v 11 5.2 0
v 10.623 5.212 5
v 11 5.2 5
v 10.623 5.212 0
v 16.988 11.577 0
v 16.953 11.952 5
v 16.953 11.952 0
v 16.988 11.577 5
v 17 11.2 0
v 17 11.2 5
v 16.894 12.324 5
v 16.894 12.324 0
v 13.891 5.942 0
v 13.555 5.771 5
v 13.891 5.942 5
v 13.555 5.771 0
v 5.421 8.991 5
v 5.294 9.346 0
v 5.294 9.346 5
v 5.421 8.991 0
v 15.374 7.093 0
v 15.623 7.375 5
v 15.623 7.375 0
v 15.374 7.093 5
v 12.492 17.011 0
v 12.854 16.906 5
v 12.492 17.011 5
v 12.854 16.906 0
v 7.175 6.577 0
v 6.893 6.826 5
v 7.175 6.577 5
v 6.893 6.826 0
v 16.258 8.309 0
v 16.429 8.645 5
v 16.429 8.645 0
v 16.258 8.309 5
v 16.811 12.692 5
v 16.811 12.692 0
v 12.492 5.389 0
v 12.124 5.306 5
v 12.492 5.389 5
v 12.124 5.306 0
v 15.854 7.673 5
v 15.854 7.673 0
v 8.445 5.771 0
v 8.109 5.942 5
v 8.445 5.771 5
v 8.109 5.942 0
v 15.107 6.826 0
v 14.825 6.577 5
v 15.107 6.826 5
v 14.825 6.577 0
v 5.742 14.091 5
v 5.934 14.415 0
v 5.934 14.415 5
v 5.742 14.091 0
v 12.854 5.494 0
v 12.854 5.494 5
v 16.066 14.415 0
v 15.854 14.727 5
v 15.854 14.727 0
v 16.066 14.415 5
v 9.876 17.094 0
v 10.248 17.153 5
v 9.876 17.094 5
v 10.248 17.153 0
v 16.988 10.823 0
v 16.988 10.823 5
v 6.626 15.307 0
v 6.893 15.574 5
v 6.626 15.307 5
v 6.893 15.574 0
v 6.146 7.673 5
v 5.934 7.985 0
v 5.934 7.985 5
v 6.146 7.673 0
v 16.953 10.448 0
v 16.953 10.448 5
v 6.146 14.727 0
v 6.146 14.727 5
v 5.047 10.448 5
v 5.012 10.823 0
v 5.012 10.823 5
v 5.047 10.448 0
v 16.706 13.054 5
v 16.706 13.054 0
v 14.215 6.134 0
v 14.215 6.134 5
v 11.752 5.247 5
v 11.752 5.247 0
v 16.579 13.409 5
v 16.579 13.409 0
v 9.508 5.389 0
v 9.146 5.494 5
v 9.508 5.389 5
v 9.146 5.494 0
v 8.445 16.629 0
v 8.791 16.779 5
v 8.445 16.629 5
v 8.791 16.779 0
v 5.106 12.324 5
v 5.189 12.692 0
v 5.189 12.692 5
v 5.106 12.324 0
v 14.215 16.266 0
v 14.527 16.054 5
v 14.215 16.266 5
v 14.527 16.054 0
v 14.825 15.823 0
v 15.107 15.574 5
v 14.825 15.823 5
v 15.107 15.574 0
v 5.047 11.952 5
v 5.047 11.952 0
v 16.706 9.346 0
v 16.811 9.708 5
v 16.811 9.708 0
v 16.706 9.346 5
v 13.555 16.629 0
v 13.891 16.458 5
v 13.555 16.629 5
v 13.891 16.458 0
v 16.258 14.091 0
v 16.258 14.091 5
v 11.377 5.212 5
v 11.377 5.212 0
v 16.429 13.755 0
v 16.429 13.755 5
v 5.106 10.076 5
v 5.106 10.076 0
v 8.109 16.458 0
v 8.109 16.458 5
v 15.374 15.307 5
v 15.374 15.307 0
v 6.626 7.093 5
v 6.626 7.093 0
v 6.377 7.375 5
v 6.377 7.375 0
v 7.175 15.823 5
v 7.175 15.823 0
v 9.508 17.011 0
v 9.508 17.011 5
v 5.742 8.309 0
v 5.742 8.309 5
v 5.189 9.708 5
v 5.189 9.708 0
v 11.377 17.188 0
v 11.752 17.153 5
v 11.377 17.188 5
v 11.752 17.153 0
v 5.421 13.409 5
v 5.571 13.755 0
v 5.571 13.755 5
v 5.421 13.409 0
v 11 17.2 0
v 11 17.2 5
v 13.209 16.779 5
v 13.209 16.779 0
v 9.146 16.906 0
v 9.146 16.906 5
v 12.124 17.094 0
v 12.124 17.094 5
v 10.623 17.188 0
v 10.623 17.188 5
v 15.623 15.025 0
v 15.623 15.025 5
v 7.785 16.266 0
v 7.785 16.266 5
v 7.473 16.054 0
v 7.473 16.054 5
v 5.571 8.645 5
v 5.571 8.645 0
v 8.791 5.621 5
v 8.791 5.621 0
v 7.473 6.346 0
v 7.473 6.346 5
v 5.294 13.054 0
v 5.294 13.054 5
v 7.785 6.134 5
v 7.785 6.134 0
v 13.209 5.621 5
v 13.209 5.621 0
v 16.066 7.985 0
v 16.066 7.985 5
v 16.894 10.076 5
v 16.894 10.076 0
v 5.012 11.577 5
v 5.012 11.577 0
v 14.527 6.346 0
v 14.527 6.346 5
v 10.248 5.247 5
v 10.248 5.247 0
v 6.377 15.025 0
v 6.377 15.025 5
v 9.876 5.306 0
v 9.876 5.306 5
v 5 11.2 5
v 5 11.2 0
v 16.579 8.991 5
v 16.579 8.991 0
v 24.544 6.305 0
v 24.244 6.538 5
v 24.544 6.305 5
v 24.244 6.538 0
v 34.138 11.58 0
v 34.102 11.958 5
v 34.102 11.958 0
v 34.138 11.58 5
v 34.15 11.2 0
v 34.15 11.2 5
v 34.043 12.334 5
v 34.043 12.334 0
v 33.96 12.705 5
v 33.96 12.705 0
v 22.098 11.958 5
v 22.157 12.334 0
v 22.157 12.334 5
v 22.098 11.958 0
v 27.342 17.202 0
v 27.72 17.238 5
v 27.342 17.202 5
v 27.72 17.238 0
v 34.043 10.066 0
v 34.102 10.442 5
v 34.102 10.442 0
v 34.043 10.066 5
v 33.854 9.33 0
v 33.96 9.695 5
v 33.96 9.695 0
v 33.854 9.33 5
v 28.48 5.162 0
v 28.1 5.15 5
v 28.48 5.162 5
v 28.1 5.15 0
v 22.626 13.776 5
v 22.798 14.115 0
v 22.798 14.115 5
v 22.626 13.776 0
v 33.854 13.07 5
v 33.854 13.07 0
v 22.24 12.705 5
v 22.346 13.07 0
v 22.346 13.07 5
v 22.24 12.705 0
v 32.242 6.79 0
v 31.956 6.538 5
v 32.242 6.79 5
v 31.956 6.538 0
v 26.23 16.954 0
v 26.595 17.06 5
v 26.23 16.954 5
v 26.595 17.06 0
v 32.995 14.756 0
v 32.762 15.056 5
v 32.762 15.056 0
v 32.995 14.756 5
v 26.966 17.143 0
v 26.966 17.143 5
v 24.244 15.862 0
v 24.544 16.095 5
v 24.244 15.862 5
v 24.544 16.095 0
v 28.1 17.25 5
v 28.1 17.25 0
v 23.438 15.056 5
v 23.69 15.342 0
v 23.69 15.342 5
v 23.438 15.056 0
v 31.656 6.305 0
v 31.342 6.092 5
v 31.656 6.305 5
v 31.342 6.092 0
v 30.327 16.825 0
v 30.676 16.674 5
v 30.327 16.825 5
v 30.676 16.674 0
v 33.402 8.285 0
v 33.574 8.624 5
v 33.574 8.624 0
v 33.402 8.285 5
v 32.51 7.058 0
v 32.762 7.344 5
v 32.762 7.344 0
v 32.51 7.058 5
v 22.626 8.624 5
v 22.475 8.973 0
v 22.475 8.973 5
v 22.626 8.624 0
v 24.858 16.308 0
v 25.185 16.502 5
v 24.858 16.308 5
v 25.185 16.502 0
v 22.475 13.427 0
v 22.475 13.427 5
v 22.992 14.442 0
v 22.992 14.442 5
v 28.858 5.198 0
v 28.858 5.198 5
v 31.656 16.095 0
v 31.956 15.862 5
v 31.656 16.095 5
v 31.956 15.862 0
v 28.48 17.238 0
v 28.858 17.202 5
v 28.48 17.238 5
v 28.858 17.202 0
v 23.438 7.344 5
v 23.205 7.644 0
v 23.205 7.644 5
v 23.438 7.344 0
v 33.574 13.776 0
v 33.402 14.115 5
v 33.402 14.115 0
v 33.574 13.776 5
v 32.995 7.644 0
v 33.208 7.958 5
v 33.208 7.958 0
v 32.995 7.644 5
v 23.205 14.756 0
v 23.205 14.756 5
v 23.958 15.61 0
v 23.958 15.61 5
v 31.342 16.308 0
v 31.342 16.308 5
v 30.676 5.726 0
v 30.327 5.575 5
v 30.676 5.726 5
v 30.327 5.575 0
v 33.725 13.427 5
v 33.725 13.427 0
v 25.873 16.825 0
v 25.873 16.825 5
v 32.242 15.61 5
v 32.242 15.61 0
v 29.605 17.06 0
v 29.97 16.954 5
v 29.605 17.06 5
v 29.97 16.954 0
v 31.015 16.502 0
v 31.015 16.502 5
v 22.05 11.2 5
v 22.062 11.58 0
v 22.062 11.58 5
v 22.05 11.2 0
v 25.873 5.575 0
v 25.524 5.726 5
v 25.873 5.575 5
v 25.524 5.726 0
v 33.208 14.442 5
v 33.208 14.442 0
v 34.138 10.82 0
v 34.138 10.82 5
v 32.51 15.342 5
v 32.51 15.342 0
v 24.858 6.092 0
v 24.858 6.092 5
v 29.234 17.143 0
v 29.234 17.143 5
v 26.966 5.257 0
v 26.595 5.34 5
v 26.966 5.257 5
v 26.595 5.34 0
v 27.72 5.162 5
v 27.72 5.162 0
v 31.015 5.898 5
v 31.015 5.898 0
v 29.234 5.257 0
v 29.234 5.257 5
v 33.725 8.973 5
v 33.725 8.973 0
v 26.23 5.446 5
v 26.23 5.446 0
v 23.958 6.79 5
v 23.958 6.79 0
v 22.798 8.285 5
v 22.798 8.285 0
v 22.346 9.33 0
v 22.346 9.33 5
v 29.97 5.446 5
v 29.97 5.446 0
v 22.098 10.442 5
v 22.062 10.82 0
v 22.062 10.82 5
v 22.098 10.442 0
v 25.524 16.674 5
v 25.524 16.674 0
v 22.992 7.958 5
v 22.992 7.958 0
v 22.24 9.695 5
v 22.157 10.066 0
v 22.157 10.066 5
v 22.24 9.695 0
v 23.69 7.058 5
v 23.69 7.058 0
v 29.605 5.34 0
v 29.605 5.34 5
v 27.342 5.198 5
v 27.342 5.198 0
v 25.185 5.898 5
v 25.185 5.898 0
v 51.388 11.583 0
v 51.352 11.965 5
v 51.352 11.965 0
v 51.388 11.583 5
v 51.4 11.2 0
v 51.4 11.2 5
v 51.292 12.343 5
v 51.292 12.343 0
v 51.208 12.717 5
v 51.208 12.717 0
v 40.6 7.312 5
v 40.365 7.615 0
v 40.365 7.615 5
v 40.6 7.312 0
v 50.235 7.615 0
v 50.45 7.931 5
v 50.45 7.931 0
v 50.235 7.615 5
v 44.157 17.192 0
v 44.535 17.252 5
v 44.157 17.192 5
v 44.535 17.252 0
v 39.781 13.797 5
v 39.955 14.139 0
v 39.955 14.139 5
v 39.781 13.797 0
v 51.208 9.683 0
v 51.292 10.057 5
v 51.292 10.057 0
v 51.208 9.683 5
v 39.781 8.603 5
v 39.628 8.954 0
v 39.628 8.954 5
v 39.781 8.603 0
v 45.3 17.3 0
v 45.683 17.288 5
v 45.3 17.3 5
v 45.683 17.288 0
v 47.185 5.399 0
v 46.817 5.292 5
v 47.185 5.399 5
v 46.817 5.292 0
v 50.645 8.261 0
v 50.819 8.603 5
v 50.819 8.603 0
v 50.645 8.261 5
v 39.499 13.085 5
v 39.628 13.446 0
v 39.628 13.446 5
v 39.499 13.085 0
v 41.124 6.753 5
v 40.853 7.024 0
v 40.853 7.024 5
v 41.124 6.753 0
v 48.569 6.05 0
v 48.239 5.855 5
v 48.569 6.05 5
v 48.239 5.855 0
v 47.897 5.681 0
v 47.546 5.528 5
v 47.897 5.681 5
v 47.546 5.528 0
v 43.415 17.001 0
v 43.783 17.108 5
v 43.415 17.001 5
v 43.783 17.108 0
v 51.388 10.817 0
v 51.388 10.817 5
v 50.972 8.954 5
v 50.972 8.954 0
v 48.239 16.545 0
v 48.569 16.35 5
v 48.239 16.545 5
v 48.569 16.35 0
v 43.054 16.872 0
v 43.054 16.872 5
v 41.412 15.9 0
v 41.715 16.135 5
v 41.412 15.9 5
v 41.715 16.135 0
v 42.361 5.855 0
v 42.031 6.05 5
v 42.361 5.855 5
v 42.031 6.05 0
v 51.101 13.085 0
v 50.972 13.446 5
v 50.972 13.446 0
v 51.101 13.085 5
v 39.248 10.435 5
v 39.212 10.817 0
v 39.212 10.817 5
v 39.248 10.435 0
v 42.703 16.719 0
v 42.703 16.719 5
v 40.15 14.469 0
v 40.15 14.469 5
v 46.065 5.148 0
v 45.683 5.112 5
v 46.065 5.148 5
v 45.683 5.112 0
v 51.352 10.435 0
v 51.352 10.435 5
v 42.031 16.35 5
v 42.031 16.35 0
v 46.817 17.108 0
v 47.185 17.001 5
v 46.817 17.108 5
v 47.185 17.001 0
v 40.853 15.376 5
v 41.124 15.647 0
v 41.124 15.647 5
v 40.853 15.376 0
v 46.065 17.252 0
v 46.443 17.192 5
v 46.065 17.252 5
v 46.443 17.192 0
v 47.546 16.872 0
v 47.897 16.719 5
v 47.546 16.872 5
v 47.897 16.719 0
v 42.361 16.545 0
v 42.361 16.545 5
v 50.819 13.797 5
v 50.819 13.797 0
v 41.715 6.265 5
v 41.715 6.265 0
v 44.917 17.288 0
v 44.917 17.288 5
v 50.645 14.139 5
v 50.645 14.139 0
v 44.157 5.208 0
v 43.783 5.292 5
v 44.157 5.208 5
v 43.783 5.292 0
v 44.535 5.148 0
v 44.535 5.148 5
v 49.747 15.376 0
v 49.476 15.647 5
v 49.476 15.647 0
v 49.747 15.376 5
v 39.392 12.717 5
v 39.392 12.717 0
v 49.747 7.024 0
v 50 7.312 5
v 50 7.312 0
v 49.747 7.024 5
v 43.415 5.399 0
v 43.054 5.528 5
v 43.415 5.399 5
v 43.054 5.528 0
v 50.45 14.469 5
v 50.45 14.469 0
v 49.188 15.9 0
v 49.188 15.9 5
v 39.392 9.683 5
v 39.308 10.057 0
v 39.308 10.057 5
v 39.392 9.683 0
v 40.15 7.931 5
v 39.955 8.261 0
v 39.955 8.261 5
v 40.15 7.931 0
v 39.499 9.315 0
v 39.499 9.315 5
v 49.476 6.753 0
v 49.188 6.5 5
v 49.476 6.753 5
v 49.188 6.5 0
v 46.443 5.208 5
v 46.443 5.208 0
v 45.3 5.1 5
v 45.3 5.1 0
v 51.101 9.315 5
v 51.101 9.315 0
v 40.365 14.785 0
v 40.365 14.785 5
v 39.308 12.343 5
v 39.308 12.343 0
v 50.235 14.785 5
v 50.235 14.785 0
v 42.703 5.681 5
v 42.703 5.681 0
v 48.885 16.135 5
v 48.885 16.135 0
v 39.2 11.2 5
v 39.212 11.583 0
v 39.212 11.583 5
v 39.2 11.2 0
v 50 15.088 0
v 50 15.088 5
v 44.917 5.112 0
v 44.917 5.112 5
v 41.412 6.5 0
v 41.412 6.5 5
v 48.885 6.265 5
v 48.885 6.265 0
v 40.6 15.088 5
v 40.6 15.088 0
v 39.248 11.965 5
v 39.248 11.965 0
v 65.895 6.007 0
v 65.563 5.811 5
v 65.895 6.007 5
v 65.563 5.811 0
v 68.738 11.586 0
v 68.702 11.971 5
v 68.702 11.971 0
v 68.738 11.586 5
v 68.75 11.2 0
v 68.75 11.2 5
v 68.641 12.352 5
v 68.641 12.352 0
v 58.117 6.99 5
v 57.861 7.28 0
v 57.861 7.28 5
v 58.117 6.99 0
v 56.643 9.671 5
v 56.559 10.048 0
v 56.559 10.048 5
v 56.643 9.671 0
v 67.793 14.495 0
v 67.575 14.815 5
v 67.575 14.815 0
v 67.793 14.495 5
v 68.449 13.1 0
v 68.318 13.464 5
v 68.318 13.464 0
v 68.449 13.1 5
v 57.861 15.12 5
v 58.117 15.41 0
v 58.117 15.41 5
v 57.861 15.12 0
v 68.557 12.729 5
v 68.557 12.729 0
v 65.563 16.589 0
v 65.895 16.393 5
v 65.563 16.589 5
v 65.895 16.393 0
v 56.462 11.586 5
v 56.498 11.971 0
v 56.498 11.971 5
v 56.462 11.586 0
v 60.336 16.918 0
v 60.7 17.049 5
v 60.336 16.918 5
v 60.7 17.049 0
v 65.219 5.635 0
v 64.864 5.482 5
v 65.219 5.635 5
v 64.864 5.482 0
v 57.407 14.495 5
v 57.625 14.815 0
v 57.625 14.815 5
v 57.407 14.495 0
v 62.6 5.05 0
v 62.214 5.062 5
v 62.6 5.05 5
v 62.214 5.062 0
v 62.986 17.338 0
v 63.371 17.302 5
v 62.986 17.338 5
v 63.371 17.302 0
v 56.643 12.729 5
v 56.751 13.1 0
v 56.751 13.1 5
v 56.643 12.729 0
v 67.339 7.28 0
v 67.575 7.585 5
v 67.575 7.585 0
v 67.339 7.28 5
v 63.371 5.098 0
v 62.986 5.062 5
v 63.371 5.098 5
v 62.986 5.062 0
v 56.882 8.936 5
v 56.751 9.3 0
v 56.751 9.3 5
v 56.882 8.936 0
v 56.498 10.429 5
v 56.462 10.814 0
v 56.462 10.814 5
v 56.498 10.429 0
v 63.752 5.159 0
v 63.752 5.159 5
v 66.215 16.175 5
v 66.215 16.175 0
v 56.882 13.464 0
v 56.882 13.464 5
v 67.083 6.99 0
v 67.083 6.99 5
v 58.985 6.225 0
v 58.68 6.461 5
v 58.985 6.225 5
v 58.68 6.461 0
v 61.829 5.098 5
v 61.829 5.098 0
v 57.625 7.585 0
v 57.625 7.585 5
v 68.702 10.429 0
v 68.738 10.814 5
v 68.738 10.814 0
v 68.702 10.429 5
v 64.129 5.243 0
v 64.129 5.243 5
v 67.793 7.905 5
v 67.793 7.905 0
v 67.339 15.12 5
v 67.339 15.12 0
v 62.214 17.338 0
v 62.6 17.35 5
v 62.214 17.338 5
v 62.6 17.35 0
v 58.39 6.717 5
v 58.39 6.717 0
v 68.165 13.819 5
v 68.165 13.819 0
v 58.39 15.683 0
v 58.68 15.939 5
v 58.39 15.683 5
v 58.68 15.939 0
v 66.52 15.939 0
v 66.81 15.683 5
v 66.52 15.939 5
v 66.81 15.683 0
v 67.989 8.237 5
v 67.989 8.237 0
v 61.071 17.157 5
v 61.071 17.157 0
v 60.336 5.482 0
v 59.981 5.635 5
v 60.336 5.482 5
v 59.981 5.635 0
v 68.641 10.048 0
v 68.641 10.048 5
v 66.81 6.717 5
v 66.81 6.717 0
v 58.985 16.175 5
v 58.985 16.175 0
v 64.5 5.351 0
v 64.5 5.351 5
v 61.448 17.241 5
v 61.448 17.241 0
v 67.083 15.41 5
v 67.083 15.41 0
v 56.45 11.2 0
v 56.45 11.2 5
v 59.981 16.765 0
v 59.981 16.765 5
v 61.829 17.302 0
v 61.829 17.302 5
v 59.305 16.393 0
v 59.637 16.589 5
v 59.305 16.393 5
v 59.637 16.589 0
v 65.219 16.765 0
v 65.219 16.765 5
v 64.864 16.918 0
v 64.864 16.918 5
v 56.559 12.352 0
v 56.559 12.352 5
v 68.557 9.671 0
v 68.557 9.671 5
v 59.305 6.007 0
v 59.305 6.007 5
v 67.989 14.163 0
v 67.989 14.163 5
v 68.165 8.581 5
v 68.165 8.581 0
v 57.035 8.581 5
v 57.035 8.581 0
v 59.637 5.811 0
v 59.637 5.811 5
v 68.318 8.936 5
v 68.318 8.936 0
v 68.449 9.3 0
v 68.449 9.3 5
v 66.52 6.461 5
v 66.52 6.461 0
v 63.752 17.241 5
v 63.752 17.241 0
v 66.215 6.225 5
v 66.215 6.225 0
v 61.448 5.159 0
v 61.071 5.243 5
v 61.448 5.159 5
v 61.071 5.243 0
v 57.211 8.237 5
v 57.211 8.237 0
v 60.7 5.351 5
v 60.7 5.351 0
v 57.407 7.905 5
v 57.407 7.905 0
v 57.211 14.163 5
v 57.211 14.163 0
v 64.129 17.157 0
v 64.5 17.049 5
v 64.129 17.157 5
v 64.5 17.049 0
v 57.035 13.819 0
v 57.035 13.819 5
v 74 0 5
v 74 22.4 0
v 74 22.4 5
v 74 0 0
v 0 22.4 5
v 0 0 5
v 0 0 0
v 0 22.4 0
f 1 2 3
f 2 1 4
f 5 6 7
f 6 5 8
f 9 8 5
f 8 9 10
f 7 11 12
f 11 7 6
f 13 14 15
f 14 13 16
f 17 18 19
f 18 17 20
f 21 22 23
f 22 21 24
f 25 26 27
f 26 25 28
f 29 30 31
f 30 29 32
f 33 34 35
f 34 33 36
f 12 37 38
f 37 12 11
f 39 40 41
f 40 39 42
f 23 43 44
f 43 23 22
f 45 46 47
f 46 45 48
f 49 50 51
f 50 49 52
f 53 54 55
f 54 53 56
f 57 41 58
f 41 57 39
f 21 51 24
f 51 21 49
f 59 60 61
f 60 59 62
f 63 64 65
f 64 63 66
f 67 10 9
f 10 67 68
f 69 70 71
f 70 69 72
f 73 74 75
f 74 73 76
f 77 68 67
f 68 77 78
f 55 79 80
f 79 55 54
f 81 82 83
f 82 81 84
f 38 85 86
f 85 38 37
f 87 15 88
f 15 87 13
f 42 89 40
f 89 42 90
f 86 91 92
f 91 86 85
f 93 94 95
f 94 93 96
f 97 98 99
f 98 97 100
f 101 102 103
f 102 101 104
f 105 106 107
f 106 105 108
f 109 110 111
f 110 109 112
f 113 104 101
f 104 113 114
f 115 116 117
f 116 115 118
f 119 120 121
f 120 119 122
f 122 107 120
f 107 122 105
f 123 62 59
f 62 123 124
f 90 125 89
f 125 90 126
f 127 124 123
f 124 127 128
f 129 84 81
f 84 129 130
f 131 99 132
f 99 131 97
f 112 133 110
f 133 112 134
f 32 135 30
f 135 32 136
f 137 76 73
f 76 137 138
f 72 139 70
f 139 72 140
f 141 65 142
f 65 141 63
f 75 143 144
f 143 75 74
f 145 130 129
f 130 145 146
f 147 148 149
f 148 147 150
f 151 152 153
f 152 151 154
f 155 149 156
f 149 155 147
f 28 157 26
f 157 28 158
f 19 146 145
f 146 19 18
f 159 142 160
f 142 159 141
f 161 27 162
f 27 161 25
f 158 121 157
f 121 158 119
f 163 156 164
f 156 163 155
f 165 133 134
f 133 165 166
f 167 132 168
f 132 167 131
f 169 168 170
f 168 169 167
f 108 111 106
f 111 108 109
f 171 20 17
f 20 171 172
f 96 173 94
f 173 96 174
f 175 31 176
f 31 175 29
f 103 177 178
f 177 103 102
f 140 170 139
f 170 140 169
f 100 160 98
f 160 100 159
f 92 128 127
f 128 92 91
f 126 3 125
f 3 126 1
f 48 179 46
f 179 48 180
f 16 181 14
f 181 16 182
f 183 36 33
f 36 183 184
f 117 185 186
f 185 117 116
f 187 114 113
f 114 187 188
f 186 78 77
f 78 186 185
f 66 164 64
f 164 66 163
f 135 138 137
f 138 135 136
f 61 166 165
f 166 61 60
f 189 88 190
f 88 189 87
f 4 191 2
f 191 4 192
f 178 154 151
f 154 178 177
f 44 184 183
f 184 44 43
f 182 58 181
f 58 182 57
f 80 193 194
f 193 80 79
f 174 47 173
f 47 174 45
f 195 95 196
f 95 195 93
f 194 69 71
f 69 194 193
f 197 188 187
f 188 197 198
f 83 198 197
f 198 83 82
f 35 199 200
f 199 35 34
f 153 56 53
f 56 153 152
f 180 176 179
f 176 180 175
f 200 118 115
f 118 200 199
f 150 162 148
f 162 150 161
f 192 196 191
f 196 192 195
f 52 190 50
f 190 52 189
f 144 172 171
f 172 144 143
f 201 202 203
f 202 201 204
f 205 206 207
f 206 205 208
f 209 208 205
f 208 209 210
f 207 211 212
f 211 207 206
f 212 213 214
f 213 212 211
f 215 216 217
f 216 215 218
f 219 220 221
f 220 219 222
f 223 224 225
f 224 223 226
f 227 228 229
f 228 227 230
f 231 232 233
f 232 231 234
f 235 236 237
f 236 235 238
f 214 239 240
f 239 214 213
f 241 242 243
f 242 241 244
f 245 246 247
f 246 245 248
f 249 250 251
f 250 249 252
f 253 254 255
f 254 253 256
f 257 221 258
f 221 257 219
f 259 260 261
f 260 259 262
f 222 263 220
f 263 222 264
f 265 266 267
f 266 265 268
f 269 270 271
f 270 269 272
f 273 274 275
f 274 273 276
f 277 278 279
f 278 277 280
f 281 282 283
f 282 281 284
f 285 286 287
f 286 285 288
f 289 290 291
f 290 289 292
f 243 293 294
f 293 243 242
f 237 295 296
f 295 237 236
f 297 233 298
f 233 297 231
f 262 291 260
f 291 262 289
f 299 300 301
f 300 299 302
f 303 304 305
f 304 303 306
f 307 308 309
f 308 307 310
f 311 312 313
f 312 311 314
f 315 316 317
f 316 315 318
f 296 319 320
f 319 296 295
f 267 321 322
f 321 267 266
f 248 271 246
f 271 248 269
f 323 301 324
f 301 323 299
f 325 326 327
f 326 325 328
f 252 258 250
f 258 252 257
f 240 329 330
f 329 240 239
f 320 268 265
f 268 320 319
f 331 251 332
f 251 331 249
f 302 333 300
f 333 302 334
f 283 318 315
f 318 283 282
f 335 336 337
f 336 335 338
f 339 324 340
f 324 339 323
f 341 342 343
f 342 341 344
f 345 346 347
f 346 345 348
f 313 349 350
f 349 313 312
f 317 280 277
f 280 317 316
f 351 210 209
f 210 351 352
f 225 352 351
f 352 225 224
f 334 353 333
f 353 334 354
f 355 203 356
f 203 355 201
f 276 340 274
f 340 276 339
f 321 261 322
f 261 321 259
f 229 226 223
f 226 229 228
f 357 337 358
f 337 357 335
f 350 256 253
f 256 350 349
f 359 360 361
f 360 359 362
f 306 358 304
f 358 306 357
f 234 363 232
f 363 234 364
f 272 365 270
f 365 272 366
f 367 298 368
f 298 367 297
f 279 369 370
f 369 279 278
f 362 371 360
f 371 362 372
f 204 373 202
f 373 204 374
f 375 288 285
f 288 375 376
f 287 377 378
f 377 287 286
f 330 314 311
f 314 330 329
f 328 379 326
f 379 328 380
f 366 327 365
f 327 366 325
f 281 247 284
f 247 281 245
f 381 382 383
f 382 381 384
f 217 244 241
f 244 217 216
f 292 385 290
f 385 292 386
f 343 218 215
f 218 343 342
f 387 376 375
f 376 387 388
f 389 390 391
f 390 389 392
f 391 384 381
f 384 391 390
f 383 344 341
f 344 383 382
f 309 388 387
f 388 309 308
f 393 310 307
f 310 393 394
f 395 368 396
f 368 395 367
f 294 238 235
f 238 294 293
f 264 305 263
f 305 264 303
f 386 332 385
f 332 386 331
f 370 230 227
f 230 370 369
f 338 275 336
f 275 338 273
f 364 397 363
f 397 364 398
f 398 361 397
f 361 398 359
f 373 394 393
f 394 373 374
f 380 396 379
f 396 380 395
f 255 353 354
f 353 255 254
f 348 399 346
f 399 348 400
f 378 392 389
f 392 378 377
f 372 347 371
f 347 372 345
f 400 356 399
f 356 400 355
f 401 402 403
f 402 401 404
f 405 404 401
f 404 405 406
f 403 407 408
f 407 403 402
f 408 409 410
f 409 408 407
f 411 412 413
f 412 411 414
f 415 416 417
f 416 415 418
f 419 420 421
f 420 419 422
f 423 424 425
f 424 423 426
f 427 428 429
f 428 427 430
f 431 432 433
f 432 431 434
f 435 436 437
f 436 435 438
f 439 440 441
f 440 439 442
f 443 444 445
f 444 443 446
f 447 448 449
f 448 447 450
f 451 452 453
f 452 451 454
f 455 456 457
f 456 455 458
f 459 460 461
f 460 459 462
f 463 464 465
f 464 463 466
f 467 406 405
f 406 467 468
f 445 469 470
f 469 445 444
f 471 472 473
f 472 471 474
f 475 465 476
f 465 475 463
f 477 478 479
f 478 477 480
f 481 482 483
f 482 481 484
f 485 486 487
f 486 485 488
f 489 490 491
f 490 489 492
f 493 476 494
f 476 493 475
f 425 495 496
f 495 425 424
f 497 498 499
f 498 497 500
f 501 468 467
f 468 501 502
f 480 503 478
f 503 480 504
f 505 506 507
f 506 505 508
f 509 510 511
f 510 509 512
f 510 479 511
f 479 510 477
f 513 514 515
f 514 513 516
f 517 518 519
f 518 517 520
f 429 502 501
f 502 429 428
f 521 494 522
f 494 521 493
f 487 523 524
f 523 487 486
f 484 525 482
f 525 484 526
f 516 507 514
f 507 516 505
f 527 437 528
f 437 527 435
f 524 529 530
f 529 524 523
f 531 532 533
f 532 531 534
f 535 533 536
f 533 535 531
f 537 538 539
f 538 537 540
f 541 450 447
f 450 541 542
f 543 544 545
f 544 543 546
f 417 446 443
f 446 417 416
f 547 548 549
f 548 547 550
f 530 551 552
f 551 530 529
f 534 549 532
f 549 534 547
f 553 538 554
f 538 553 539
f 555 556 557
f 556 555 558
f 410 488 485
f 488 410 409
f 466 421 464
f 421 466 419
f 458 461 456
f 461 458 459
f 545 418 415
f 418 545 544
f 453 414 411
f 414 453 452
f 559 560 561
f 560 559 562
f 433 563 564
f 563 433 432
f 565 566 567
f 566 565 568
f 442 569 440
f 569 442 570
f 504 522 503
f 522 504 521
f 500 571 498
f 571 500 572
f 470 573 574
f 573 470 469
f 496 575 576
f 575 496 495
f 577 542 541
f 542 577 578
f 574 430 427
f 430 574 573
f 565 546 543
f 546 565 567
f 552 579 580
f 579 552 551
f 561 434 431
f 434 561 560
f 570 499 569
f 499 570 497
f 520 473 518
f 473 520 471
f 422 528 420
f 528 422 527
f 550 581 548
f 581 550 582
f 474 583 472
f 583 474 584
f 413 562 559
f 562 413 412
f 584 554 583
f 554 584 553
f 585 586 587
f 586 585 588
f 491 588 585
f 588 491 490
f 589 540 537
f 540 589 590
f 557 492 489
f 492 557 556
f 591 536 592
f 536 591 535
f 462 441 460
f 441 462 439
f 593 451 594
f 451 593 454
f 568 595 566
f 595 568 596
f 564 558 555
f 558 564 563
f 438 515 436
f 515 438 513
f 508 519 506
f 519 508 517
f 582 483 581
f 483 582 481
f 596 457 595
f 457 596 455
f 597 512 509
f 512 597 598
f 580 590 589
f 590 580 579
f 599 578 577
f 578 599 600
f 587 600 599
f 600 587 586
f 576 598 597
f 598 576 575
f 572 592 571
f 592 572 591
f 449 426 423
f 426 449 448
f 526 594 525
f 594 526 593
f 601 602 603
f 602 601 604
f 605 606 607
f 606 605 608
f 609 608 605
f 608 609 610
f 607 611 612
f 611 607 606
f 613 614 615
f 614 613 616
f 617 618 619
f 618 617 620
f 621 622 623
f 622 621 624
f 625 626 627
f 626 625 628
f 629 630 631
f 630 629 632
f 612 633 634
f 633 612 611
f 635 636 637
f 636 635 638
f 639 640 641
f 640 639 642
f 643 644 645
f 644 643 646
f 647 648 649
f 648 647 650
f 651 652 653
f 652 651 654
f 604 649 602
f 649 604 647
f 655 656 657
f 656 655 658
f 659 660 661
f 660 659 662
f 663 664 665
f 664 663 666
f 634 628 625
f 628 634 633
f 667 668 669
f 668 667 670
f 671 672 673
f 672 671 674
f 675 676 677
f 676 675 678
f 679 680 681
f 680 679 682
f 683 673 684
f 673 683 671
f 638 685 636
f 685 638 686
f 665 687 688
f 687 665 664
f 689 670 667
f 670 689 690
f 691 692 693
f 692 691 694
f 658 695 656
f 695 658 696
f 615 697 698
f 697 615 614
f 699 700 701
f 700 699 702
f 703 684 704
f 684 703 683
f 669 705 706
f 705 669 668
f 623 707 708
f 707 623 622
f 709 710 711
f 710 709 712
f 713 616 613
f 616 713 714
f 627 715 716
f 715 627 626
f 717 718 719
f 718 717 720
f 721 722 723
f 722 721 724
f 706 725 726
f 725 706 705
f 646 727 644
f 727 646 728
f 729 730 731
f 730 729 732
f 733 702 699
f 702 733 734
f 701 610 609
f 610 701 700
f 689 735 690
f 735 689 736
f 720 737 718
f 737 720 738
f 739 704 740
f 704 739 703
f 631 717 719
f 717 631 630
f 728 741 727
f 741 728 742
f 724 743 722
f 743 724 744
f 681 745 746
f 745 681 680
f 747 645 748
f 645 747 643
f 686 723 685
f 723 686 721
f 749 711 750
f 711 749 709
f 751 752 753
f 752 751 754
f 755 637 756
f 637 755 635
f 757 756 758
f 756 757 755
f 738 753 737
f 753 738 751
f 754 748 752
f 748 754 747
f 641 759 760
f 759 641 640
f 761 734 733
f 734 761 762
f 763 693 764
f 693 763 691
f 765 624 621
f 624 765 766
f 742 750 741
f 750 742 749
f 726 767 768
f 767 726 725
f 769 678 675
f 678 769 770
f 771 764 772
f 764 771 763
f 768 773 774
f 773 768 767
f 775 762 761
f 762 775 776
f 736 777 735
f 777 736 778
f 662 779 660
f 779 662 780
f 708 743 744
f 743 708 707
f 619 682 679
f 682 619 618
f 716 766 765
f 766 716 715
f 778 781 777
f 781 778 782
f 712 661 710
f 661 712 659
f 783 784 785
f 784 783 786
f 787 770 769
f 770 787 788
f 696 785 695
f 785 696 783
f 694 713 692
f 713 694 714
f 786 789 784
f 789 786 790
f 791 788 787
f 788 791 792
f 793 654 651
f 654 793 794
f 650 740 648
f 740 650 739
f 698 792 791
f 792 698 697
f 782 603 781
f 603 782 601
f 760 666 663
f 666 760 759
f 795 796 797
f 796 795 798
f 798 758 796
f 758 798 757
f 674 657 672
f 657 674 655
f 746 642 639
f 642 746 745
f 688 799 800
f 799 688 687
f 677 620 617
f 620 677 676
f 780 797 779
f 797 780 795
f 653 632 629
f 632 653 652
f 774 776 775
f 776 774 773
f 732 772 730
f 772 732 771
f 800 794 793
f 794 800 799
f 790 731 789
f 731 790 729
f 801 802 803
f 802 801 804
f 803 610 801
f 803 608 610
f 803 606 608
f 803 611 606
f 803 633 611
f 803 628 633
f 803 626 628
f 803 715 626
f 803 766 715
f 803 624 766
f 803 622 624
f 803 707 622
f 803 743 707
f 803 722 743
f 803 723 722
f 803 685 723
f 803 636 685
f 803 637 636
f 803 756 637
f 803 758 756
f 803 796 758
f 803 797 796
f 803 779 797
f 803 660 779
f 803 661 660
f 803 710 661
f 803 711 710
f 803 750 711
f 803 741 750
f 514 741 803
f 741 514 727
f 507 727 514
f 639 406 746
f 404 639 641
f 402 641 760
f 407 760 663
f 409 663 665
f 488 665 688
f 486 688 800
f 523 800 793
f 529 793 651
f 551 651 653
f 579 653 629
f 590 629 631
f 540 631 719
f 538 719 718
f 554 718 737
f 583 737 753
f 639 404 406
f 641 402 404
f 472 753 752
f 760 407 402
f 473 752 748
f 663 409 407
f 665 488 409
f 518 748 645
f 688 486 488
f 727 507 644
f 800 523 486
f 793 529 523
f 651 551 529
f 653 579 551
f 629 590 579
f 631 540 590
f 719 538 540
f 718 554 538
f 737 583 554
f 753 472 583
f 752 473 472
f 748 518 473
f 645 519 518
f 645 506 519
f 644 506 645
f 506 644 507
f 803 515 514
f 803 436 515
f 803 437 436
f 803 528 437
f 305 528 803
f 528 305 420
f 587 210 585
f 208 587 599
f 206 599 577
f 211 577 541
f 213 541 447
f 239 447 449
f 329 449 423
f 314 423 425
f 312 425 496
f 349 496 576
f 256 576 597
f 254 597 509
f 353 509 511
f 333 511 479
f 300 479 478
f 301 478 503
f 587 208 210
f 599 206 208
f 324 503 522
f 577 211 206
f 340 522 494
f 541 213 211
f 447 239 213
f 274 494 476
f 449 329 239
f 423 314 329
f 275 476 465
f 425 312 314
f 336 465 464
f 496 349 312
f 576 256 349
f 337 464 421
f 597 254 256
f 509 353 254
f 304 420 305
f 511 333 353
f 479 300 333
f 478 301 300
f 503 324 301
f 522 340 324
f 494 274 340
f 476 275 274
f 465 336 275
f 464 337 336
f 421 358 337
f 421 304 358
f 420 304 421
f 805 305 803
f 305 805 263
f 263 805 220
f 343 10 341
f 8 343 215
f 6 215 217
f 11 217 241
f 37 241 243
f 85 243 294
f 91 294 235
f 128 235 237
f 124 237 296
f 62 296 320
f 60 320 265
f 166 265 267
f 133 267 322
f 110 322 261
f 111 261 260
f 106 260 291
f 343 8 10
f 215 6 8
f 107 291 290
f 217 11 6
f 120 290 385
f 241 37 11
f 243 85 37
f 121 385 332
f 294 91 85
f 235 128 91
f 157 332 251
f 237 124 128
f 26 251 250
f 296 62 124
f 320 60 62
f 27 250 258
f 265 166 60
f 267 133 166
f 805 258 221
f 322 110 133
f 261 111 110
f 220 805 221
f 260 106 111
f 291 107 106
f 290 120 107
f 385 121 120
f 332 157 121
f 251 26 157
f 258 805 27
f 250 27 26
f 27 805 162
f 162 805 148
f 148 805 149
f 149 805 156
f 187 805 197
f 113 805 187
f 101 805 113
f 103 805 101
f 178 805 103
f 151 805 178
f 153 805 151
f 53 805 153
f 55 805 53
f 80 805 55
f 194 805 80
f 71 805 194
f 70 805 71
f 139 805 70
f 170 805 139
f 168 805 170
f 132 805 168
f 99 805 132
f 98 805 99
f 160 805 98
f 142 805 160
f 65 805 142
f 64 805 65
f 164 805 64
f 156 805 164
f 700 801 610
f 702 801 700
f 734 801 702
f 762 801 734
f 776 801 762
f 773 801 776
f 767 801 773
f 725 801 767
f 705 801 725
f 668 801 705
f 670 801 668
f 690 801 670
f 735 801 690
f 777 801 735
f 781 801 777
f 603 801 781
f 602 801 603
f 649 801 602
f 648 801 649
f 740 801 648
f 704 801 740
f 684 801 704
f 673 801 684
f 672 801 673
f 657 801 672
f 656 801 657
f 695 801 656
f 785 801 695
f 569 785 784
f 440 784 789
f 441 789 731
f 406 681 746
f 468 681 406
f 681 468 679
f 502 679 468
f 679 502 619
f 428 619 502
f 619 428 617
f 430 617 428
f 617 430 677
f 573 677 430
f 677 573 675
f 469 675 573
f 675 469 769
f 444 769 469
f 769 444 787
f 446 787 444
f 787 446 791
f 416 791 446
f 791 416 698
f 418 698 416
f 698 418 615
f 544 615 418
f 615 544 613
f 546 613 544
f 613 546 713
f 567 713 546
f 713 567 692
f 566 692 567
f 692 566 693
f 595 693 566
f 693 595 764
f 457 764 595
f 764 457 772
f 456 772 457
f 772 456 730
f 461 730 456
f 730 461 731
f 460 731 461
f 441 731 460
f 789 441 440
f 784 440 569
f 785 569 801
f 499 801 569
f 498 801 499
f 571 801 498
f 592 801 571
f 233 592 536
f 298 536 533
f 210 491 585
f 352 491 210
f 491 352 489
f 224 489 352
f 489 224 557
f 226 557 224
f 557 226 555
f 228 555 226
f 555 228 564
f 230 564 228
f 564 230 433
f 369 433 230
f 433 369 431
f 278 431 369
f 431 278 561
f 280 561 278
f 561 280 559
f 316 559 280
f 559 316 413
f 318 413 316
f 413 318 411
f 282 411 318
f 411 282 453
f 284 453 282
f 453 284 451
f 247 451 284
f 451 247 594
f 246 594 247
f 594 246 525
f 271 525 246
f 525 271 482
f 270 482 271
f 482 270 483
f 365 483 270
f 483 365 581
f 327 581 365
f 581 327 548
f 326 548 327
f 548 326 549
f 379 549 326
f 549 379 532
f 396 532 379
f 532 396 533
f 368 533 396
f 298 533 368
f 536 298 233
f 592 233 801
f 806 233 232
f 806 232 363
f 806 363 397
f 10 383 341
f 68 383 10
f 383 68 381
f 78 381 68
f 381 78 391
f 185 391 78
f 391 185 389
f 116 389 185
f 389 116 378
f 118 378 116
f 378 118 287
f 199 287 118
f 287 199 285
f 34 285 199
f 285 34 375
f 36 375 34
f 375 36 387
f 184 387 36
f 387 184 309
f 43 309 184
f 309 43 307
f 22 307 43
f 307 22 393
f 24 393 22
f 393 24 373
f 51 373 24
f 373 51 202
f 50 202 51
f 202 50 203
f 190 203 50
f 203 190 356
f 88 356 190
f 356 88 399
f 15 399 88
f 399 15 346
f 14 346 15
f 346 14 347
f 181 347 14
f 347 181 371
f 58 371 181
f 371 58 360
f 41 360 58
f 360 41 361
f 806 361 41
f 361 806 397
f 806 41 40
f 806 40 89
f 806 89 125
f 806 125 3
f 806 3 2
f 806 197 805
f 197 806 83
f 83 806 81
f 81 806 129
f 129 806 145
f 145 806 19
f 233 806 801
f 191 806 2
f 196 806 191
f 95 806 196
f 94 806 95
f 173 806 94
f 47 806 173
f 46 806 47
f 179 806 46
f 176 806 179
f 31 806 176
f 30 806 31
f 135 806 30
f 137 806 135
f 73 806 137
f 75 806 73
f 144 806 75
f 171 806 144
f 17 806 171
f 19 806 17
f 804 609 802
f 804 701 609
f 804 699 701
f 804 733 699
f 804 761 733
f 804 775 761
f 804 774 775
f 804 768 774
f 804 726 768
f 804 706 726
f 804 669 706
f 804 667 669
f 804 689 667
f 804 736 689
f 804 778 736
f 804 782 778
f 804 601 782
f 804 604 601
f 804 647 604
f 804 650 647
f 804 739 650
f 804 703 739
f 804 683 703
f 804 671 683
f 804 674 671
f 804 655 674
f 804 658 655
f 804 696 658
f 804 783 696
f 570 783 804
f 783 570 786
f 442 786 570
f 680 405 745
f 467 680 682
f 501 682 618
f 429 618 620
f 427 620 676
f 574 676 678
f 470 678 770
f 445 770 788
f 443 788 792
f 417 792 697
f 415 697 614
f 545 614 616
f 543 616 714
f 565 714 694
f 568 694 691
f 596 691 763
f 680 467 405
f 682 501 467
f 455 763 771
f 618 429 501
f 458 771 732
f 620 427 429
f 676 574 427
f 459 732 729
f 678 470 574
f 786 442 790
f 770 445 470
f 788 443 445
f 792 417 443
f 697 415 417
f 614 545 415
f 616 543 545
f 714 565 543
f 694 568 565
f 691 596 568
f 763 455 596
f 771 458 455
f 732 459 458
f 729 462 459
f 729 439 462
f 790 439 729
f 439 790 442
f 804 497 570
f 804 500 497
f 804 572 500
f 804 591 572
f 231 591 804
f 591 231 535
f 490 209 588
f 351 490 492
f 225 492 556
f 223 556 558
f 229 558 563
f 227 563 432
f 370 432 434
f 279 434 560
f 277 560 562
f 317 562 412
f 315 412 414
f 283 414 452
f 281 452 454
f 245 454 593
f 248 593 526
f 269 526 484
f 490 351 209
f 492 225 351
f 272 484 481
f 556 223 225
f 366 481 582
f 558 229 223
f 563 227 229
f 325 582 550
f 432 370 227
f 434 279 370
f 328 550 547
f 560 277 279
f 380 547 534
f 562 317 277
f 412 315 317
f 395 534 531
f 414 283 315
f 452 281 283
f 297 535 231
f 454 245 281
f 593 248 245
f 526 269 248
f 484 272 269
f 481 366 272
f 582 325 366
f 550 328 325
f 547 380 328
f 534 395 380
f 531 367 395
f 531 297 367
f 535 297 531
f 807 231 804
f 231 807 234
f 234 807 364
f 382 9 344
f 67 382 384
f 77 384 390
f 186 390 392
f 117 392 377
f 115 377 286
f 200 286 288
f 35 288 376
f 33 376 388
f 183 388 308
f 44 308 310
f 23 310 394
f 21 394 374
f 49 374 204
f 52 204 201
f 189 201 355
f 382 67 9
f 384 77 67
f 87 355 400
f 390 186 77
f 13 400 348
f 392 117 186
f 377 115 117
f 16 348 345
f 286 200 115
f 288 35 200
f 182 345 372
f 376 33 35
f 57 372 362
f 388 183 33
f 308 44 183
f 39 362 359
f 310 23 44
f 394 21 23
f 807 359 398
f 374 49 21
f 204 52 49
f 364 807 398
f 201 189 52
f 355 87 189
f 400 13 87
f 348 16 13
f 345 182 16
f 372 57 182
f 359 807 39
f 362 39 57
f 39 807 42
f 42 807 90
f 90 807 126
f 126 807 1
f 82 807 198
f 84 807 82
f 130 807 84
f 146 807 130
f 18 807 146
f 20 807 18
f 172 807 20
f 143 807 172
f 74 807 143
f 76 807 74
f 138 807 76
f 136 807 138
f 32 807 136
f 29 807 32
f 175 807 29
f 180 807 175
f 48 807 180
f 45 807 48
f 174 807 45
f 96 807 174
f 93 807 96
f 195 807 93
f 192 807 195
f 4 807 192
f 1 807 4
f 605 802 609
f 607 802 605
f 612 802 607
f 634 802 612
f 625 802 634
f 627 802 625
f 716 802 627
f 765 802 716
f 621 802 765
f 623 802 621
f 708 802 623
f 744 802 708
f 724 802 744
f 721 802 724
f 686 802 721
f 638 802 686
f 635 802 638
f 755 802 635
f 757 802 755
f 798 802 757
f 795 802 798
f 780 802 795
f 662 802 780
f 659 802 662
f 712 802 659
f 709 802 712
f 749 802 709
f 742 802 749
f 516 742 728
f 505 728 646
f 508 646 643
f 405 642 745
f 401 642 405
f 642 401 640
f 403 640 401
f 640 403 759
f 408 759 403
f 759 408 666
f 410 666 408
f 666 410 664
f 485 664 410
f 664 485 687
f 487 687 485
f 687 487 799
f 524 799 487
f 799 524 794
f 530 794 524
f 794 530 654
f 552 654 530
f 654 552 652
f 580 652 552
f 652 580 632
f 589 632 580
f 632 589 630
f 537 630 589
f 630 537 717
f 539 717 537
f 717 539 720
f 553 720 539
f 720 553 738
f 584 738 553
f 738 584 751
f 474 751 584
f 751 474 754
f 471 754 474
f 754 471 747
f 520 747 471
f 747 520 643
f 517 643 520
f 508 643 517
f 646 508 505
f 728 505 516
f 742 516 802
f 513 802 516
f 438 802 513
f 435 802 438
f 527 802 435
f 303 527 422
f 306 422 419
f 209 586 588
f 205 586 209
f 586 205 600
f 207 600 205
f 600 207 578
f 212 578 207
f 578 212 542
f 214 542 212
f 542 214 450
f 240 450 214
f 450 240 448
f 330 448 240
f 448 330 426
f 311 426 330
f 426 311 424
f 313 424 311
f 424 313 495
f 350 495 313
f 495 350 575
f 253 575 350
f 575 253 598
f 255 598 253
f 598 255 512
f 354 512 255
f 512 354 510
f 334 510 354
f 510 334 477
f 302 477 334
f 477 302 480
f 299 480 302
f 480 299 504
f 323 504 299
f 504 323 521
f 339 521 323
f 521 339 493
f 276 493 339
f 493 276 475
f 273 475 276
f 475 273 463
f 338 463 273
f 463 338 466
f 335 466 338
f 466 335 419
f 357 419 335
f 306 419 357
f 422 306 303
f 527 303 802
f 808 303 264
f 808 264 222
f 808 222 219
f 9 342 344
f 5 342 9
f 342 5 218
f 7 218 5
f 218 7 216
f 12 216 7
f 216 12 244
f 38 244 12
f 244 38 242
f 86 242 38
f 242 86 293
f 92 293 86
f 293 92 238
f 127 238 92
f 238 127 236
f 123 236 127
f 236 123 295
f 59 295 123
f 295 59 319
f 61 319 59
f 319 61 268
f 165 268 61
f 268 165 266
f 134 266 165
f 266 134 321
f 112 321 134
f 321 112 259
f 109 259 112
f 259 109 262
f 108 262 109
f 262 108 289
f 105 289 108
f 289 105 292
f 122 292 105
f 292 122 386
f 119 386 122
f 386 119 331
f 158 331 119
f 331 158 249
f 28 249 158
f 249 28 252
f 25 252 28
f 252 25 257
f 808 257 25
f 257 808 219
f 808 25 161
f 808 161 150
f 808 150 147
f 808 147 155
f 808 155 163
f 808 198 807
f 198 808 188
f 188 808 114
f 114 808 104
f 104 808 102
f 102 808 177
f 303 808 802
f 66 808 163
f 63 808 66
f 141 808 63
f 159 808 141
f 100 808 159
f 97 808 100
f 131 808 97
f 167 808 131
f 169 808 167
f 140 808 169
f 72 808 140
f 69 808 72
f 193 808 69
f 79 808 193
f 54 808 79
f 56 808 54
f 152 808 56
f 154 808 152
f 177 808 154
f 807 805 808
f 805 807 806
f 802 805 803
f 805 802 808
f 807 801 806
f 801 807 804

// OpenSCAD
// Number of facets on each hole.
facets=100;

// The diameter of the smallest hole.
base_hole = 12.0;

// How much to increase the size of each hole.
step = 0.1;

// How many holes to make.
count = 4;

// How much space between each hole.
pad = 5;

// How thick should the block be.
block_thickness = 5;

// How wide the block should be.
// Big enough for the widest hole plus padding on each side.
block_width = base_hole + step*count + pad*2;

// How long the block should be.
// Size of the smallest hole * the number of holes +
// 1 pad for each hole (plus 1 more for the end) +
// the accumulated growth of each hole (sum of arithemetic sequence).
block_length = (base_hole + pad + (step + step*count)/2) * count + pad;

difference() {
  // The block
  cube([block_length,block_width,block_thickness], false);
  
  // The holes
  union() {
    for(i=[0:count-1]) {
      // Offset for each hole is the same as the length calculation
      // except for the current index instead of the total.
      translate([(base_hole + pad + (step + step*i)/2)*i + base_hole/2 + pad,block_width/2,-1]) {
        // Hole size is just the smallest hole size plus the step times
        // index.
        cylinder(d=base_hole+step*i, h=block_thickness+2, $fn=facets);
      }
    }
  }
}
